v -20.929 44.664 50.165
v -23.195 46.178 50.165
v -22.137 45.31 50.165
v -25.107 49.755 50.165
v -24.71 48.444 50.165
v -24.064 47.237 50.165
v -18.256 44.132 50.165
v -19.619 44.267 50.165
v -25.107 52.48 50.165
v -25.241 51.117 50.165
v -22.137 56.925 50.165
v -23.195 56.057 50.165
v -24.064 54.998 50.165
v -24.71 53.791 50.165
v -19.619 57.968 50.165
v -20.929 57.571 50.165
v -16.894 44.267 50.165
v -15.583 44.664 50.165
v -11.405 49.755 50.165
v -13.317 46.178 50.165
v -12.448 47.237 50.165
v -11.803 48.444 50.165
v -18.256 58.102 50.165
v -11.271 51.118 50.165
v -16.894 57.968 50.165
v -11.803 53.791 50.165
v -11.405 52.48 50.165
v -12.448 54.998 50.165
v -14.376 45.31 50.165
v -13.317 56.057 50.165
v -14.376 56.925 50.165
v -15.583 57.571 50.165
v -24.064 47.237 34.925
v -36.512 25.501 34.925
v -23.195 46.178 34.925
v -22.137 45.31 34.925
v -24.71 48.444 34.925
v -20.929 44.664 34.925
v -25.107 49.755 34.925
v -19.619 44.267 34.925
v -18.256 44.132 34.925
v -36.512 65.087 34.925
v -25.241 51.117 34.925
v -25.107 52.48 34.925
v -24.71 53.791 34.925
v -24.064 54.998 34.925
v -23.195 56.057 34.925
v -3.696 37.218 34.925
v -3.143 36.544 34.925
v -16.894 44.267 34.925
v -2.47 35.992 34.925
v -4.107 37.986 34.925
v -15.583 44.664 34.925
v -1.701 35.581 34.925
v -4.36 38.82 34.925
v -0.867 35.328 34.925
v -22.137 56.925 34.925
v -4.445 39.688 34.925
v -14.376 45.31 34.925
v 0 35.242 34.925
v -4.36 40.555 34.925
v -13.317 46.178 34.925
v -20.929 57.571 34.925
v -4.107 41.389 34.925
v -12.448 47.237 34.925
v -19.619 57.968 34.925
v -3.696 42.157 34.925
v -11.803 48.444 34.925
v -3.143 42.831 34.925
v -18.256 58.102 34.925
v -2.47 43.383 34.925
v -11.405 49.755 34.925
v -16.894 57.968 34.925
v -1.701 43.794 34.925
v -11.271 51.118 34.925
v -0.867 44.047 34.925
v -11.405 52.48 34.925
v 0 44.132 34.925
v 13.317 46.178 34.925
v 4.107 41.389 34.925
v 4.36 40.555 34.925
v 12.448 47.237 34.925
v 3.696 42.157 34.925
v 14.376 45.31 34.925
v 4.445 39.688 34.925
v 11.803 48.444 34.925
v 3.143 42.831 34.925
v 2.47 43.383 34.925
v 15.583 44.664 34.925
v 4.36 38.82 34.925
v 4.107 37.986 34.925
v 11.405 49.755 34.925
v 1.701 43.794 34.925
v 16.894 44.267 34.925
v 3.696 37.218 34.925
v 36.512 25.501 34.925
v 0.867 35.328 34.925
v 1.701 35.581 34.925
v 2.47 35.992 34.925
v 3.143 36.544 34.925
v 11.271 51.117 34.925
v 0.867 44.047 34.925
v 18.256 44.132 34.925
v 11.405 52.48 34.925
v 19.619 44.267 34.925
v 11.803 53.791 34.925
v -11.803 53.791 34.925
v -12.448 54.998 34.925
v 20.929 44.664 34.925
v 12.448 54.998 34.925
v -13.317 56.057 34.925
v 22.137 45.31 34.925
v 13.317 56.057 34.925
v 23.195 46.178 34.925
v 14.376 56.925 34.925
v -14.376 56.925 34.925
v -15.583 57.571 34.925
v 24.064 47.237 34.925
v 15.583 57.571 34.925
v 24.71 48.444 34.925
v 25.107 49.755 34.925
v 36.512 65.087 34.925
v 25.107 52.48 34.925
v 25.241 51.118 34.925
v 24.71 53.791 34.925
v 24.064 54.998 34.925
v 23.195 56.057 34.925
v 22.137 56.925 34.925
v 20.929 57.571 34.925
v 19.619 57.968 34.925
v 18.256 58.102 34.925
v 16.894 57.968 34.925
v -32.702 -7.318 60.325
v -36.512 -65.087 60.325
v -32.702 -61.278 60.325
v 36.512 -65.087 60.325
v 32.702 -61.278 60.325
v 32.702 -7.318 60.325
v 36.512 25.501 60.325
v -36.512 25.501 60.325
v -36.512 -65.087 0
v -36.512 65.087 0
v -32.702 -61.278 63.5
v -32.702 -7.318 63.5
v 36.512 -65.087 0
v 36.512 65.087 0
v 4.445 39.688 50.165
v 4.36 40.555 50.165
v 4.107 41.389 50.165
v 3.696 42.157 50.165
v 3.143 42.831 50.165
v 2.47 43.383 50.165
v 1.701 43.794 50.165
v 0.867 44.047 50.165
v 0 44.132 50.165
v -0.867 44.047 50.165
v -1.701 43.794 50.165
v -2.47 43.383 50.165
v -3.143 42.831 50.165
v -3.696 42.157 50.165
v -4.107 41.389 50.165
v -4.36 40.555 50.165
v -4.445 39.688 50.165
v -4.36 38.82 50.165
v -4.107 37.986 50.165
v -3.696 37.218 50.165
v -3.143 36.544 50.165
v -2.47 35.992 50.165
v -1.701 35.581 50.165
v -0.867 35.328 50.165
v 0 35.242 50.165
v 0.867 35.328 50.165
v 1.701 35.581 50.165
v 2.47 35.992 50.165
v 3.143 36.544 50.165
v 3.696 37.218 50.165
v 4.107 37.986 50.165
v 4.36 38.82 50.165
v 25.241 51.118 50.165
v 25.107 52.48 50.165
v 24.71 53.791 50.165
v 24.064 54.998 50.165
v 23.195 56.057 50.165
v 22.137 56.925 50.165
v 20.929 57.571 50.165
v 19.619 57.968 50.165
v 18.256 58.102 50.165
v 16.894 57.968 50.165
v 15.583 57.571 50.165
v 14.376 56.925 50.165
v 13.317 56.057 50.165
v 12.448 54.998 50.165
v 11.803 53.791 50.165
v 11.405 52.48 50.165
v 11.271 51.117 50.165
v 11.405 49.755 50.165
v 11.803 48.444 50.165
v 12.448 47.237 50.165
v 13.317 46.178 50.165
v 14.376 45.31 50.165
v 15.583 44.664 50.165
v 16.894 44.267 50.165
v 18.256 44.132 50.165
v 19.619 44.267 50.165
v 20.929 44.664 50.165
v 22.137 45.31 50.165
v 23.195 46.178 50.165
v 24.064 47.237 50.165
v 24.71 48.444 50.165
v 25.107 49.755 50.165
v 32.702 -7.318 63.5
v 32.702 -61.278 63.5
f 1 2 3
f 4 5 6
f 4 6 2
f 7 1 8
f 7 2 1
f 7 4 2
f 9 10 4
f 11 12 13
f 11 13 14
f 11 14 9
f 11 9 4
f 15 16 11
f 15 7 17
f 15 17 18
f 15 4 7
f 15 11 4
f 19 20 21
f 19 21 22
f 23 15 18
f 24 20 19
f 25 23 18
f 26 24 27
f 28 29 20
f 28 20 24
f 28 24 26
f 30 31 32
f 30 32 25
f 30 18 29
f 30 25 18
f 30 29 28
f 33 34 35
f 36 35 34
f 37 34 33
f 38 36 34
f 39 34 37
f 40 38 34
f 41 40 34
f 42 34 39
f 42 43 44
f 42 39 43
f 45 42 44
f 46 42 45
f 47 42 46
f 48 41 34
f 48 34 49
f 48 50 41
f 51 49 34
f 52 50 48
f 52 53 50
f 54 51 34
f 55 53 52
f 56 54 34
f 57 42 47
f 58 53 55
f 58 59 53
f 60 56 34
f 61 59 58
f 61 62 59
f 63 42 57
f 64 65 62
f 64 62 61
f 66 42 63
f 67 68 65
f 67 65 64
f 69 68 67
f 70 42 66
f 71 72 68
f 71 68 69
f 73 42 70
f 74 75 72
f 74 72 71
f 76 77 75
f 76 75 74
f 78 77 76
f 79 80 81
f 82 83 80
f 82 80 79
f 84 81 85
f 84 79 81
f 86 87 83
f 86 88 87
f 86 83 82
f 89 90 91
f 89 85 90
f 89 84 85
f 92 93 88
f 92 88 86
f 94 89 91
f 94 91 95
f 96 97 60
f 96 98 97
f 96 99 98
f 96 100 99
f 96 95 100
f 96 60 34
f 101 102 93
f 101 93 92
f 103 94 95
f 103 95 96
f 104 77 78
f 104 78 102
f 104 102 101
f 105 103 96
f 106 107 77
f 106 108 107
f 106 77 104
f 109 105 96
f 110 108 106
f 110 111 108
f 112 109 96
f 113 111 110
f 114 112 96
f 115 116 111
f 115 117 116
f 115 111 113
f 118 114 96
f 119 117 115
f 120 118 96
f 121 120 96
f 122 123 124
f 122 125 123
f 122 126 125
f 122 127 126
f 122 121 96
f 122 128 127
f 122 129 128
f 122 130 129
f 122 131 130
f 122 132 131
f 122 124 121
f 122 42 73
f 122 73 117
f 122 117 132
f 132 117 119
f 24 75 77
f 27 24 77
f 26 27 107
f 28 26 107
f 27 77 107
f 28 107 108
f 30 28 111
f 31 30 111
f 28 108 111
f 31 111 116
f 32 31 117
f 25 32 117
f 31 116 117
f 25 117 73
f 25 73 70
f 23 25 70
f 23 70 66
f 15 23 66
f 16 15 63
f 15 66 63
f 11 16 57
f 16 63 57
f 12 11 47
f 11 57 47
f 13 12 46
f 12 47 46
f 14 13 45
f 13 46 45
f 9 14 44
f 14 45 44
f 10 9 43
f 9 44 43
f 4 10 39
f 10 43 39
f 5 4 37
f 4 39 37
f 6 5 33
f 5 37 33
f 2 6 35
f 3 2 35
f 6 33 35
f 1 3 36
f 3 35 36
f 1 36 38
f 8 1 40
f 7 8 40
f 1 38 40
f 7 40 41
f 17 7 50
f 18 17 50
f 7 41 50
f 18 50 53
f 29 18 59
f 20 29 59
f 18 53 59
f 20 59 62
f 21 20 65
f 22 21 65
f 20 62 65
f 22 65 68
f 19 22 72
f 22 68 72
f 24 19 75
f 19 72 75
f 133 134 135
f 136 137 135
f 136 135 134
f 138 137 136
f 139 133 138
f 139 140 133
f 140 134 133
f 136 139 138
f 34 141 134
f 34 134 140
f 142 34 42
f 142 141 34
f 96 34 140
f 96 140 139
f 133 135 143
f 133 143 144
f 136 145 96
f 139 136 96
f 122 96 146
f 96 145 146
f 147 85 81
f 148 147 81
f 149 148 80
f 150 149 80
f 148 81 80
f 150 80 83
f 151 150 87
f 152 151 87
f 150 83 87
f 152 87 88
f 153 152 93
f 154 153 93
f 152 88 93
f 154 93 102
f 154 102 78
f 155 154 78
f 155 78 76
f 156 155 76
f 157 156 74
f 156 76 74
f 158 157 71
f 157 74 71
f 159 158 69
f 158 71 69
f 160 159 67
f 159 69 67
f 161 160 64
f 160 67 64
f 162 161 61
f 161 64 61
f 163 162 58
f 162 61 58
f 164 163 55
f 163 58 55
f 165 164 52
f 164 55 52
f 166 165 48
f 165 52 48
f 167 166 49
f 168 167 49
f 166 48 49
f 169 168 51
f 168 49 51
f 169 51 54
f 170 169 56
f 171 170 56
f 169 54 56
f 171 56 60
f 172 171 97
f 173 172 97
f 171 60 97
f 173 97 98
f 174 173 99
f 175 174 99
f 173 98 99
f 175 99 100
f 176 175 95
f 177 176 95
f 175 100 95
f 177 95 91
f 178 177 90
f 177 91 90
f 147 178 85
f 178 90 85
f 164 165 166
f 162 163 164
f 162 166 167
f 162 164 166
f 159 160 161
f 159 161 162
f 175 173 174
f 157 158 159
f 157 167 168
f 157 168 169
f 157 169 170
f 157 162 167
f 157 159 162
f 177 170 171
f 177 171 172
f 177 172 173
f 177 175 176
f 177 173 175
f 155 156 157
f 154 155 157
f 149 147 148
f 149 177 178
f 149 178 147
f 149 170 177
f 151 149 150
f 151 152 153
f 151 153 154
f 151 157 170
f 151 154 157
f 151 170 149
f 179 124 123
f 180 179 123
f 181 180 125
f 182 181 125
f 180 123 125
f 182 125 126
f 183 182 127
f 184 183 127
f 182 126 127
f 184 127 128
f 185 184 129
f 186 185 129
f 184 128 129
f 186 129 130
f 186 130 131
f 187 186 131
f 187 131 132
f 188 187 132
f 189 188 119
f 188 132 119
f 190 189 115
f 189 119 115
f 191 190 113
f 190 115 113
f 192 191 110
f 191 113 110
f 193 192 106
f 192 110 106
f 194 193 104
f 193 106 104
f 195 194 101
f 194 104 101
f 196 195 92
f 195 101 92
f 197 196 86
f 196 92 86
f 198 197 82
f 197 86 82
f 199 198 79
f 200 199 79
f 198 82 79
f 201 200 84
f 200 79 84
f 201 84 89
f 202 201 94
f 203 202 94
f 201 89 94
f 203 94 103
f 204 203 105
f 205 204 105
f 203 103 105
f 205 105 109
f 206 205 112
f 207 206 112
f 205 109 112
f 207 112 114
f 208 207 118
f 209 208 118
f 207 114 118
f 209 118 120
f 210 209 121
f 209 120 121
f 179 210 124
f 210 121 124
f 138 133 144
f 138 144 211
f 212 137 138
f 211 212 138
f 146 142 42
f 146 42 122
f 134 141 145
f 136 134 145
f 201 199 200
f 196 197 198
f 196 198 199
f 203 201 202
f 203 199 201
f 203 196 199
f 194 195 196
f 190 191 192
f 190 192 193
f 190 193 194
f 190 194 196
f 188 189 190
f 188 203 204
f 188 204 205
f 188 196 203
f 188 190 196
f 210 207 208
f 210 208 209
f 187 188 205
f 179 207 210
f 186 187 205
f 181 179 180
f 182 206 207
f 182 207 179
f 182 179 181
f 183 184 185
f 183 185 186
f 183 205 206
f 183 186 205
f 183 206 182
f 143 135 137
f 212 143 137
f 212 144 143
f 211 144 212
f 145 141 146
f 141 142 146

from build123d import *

# Parameters (mm, degrees)
F0_W     = 73.025
F0_H     = 90.588317
F1_DEPTH = 60.325
F0_H_2   = 39.586683
F2_DEPTH = 34.925
F3_W     = 65.405
F3_H     = 53.959612
F4_DEPTH = 3.175
F5_R     = 6.985
F5_R_2   = 4.445
F6_DEPTH = 15.24


with BuildPart() as f1:
    # F0 (on Top) → F1 (new body)
    with BuildSketch(Plane.XY):
        with Locations((0, -19.793341)):
            Rectangle(F0_W, F0_H)
    extrude(amount=F1_DEPTH)

    # F0 (on Top) → F2 (join)
    with BuildSketch(Plane.XY):
        with Locations((0, 45.294158)):
            Rectangle(F0_W, F0_H_2)
        with Locations((0, -19.793341)):
            Rectangle(F0_W, F0_H)
    extrude(amount=F2_DEPTH)

    # F3 (on face) → F4 (join)
    with BuildSketch(Plane.XY.offset(60.325)):
        with Locations((0, -34.297694)):
            Rectangle(F3_W, F3_H)
    extrude(amount=F4_DEPTH)

    # F5 (on face) → F6 (join)
    with BuildSketch(Plane.XY.offset(34.925)):
        with Locations((-18.25625, 51.1175)):
            Circle(F5_R)
        with Locations((0, 39.6875)):
            Circle(F5_R_2)
        with Locations((18.25625, 51.1175)):
            Circle(F5_R)
    extrude(amount=F6_DEPTH)


solid = f1.part
